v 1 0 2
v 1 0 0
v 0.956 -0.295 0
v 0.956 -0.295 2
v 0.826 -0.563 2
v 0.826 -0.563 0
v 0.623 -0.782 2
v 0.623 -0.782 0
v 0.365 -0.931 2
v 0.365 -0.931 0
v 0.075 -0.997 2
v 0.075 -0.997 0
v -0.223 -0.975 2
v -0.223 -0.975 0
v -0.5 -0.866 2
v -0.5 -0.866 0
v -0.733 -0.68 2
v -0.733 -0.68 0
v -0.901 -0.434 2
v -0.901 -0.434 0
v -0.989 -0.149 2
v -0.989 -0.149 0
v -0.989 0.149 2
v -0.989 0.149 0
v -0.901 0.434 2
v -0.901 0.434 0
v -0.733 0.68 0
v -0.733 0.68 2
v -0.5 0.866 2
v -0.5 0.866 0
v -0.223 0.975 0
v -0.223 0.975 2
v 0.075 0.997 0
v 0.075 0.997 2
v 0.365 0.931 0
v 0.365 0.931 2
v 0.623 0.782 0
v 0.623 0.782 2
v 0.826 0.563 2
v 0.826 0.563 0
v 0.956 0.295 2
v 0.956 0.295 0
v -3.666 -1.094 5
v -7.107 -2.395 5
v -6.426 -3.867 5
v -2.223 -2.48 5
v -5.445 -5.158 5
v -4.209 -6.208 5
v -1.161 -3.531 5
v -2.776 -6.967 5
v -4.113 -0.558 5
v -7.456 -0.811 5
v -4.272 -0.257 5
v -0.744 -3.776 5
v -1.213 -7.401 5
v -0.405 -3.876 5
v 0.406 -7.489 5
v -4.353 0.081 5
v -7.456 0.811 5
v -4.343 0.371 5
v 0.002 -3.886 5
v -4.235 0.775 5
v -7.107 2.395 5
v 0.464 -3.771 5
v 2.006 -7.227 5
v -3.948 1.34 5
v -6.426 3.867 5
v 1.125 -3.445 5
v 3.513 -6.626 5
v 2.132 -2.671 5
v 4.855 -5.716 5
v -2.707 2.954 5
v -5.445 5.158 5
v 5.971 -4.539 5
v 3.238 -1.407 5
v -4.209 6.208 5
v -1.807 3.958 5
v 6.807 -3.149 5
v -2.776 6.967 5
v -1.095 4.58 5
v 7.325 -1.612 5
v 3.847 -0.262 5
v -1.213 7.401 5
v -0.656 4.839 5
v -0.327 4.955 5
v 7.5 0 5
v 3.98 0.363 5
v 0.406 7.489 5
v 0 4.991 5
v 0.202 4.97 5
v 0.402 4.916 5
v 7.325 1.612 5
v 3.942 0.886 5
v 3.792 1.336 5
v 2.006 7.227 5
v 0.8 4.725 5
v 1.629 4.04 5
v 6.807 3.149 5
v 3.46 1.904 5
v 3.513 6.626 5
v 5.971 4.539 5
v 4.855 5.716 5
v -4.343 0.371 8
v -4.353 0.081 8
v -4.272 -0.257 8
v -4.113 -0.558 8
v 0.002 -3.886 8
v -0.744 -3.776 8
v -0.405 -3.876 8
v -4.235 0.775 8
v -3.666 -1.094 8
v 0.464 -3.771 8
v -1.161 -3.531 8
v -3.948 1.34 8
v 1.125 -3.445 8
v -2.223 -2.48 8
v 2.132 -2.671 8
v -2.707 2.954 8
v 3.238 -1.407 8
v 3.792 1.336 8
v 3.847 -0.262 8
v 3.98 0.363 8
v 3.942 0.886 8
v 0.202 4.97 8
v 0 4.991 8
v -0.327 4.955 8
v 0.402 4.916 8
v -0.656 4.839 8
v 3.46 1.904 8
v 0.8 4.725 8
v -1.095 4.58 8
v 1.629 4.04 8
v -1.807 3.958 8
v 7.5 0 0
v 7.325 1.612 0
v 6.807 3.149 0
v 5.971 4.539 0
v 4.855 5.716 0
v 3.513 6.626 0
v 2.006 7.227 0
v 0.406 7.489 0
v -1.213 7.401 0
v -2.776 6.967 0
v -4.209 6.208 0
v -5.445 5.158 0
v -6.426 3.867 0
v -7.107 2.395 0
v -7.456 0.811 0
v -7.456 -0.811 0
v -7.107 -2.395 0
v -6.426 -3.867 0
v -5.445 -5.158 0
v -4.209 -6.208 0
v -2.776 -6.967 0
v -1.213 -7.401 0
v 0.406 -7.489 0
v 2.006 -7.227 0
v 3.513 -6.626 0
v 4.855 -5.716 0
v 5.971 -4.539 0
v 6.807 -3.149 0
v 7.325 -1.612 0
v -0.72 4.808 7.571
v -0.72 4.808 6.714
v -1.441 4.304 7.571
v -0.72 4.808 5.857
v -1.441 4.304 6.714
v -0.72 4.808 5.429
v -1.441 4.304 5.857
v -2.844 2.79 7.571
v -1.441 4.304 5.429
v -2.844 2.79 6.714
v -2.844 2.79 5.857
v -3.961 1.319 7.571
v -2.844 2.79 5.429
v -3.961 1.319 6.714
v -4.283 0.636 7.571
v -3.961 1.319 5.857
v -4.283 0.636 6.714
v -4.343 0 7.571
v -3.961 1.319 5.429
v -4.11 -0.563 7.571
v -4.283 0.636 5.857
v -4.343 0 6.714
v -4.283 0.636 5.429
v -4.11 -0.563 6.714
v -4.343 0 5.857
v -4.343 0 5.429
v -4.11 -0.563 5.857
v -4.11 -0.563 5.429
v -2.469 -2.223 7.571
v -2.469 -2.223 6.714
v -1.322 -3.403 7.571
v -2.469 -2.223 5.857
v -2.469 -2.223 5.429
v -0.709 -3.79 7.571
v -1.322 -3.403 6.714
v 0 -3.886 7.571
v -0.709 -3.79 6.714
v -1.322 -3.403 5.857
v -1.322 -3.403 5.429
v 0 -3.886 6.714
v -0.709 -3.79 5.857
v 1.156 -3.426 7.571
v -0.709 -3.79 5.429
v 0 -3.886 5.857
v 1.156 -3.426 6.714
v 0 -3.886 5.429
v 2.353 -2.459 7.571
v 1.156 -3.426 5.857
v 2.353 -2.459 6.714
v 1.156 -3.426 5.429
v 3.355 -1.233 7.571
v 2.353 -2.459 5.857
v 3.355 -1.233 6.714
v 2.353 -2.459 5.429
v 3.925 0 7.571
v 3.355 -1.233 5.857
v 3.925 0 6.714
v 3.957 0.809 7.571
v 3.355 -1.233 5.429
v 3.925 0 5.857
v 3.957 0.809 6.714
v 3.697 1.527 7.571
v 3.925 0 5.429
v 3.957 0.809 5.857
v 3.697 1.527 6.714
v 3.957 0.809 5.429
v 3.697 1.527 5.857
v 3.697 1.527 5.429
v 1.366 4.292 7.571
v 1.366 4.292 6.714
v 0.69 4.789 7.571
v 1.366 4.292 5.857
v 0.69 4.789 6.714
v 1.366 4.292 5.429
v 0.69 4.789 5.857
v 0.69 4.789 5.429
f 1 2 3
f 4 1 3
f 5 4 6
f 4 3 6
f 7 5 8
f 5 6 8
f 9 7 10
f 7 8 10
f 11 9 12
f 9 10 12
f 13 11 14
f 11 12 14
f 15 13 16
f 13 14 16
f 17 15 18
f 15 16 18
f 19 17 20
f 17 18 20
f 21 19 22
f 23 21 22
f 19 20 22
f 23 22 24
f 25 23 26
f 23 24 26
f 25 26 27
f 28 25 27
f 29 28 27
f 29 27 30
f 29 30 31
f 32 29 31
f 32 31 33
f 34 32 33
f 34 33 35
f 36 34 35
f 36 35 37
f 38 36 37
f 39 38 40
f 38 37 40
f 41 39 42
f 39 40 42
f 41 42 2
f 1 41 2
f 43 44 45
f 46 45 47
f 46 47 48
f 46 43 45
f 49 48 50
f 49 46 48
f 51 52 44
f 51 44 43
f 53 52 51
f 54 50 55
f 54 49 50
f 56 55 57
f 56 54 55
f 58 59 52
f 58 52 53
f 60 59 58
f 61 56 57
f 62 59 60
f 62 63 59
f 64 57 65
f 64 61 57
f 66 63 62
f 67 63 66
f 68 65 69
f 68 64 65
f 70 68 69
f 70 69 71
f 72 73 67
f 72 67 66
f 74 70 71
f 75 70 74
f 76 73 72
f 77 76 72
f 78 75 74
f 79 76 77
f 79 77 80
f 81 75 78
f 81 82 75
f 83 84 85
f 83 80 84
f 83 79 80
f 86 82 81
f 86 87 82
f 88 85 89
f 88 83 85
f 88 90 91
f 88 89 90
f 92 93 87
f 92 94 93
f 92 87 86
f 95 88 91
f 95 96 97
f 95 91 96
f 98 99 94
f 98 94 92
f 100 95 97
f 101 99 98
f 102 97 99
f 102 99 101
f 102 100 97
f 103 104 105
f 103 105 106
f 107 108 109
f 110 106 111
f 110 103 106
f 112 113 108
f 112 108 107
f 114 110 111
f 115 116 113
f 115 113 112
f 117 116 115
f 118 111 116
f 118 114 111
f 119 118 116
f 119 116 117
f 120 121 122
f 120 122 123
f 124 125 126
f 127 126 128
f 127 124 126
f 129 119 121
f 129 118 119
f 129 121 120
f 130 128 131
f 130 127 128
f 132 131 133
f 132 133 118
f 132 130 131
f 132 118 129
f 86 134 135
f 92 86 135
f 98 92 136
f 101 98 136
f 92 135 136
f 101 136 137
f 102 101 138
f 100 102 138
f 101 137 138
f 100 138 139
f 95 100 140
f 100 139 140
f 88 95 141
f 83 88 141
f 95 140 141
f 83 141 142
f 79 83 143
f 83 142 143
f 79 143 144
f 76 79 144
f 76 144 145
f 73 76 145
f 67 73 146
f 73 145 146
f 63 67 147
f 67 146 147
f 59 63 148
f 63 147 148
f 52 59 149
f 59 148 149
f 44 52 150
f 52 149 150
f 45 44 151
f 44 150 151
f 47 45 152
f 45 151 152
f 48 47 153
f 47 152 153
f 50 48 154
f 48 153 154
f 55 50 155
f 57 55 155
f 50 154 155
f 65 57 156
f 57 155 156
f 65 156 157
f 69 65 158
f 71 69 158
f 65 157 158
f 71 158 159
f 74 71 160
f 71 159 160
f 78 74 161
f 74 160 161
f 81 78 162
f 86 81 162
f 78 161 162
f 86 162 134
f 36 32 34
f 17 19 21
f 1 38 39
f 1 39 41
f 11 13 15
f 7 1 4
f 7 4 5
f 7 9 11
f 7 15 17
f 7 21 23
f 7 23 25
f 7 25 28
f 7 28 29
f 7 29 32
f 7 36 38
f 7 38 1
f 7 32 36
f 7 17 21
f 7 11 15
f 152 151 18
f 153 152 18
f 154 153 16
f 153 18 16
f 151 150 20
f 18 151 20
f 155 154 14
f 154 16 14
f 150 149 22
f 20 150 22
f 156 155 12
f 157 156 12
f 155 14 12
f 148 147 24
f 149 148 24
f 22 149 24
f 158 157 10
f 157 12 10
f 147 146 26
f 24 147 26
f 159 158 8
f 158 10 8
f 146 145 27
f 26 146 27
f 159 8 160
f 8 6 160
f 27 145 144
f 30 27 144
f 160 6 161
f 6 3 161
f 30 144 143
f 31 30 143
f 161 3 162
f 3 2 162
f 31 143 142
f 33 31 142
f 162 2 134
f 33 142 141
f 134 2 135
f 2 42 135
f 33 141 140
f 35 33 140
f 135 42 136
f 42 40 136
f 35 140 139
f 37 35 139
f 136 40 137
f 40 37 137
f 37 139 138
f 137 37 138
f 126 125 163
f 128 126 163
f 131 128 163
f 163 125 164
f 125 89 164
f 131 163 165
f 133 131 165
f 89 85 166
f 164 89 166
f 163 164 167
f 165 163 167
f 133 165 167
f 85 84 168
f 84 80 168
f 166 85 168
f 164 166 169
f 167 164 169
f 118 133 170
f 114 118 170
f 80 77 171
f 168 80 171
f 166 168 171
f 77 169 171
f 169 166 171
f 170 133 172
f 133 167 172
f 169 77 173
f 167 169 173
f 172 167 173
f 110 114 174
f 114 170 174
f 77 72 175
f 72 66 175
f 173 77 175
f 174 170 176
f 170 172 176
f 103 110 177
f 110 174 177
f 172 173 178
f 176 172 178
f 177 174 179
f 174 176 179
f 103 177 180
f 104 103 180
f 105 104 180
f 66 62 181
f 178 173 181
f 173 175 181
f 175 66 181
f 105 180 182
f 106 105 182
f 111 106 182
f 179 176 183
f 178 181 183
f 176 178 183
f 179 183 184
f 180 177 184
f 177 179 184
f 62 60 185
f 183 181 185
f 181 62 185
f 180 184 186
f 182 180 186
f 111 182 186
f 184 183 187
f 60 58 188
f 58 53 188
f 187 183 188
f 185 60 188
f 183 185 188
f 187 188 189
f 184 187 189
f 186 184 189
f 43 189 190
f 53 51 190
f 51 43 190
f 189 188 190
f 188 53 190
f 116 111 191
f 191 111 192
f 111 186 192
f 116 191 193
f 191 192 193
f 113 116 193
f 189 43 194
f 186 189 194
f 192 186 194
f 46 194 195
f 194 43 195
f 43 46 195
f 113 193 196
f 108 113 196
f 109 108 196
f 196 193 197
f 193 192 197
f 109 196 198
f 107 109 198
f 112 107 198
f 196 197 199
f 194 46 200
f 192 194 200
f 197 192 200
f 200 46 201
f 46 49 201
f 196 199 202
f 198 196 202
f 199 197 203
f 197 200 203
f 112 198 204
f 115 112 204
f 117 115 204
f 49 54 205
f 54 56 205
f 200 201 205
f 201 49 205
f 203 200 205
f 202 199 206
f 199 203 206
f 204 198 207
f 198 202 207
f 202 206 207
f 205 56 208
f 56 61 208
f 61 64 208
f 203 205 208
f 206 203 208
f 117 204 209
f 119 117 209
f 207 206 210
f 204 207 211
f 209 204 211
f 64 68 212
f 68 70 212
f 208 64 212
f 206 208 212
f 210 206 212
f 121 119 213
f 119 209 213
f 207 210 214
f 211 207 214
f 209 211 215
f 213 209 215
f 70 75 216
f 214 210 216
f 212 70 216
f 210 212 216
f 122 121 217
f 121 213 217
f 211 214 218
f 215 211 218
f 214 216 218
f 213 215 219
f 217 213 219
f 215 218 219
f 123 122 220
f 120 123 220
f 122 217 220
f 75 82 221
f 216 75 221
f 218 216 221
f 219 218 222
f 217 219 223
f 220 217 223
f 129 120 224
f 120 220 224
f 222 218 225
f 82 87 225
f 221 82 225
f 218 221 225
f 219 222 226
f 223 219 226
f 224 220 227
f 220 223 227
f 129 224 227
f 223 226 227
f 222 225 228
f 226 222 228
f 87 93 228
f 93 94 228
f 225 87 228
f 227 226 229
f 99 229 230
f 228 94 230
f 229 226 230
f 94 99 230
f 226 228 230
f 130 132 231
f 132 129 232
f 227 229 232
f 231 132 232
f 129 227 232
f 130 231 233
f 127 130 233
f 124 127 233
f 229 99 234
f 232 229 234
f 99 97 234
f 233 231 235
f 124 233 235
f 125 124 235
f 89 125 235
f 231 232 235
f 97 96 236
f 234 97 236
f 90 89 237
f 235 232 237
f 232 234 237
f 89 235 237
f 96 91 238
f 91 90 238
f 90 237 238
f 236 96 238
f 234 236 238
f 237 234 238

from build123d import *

# Parameters (mm, degrees)
F0_R     = 7.5
F1_DEPTH = 5
F3_DEPTH = 3
F4_R     = 1
F5_DEPTH = 2
F6_DEPTH = 2


with BuildPart() as f1:
    # F0 (on Top) → F1 (new body)
    with BuildSketch(Plane.XY):
        Circle(F0_R)
    extrude(amount=F1_DEPTH)

    # F2 (on face) → F3 (join)
    with BuildSketch(Plane.XY.offset(5)):
        with BuildLine():
            add(Edge.make_bspline(
                [(0, 4.9912175164), (-0.9549051723, 5.0130336664), (-2.8630161183, 2.7994808775), (-5.2187312486, -0.1081066721), (-2.2933239008, -2.0727410294), (-0.1707501501, -5.3286024085), (5.1814683056, 0.1133416257), (2.6939424426, 2.7725004839), (0.927597529, 4.9700252478), (0, 4.9912175164)],
                knots=[0, 0, 0, 0, 0.1450676006, 0.2811878838, 0.4116101556, 0.543592546, 0.7233555498, 0.859080931, 1, 1, 1, 1], degree=3))
        make_face()
    extrude(amount=F3_DEPTH)

    # F4 (on face) → F5 (cut)
    with BuildSketch(Plane(origin=(0, 0, 0), x_dir=(1, 0, 0), z_dir=(0, 0, -1))):
        Circle(F4_R)
    extrude(amount=-F5_DEPTH, mode=Mode.SUBTRACT)

    # F2 (on face) → F6 (join)
    with BuildSketch(Plane.XY.offset(5)):
        with BuildLine():
            add(Edge.make_bspline(
                [(0, 4.9912175164), (-0.9549051723, 5.0130336664), (-2.8630161183, 2.7994808775), (-5.2187312486, -0.1081066721), (-2.2933239008, -2.0727410294), (-0.1707501501, -5.3286024085), (5.1814683056, 0.1133416257), (2.6939424426, 2.7725004839), (0.927597529, 4.9700252478), (0, 4.9912175164)],
                knots=[0, 0, 0, 0, 0.1450676006, 0.2811878838, 0.4116101556, 0.543592546, 0.7233555498, 0.859080931, 1, 1, 1, 1], degree=3))
        make_face()
    extrude(amount=F6_DEPTH)


solid = f1.part
